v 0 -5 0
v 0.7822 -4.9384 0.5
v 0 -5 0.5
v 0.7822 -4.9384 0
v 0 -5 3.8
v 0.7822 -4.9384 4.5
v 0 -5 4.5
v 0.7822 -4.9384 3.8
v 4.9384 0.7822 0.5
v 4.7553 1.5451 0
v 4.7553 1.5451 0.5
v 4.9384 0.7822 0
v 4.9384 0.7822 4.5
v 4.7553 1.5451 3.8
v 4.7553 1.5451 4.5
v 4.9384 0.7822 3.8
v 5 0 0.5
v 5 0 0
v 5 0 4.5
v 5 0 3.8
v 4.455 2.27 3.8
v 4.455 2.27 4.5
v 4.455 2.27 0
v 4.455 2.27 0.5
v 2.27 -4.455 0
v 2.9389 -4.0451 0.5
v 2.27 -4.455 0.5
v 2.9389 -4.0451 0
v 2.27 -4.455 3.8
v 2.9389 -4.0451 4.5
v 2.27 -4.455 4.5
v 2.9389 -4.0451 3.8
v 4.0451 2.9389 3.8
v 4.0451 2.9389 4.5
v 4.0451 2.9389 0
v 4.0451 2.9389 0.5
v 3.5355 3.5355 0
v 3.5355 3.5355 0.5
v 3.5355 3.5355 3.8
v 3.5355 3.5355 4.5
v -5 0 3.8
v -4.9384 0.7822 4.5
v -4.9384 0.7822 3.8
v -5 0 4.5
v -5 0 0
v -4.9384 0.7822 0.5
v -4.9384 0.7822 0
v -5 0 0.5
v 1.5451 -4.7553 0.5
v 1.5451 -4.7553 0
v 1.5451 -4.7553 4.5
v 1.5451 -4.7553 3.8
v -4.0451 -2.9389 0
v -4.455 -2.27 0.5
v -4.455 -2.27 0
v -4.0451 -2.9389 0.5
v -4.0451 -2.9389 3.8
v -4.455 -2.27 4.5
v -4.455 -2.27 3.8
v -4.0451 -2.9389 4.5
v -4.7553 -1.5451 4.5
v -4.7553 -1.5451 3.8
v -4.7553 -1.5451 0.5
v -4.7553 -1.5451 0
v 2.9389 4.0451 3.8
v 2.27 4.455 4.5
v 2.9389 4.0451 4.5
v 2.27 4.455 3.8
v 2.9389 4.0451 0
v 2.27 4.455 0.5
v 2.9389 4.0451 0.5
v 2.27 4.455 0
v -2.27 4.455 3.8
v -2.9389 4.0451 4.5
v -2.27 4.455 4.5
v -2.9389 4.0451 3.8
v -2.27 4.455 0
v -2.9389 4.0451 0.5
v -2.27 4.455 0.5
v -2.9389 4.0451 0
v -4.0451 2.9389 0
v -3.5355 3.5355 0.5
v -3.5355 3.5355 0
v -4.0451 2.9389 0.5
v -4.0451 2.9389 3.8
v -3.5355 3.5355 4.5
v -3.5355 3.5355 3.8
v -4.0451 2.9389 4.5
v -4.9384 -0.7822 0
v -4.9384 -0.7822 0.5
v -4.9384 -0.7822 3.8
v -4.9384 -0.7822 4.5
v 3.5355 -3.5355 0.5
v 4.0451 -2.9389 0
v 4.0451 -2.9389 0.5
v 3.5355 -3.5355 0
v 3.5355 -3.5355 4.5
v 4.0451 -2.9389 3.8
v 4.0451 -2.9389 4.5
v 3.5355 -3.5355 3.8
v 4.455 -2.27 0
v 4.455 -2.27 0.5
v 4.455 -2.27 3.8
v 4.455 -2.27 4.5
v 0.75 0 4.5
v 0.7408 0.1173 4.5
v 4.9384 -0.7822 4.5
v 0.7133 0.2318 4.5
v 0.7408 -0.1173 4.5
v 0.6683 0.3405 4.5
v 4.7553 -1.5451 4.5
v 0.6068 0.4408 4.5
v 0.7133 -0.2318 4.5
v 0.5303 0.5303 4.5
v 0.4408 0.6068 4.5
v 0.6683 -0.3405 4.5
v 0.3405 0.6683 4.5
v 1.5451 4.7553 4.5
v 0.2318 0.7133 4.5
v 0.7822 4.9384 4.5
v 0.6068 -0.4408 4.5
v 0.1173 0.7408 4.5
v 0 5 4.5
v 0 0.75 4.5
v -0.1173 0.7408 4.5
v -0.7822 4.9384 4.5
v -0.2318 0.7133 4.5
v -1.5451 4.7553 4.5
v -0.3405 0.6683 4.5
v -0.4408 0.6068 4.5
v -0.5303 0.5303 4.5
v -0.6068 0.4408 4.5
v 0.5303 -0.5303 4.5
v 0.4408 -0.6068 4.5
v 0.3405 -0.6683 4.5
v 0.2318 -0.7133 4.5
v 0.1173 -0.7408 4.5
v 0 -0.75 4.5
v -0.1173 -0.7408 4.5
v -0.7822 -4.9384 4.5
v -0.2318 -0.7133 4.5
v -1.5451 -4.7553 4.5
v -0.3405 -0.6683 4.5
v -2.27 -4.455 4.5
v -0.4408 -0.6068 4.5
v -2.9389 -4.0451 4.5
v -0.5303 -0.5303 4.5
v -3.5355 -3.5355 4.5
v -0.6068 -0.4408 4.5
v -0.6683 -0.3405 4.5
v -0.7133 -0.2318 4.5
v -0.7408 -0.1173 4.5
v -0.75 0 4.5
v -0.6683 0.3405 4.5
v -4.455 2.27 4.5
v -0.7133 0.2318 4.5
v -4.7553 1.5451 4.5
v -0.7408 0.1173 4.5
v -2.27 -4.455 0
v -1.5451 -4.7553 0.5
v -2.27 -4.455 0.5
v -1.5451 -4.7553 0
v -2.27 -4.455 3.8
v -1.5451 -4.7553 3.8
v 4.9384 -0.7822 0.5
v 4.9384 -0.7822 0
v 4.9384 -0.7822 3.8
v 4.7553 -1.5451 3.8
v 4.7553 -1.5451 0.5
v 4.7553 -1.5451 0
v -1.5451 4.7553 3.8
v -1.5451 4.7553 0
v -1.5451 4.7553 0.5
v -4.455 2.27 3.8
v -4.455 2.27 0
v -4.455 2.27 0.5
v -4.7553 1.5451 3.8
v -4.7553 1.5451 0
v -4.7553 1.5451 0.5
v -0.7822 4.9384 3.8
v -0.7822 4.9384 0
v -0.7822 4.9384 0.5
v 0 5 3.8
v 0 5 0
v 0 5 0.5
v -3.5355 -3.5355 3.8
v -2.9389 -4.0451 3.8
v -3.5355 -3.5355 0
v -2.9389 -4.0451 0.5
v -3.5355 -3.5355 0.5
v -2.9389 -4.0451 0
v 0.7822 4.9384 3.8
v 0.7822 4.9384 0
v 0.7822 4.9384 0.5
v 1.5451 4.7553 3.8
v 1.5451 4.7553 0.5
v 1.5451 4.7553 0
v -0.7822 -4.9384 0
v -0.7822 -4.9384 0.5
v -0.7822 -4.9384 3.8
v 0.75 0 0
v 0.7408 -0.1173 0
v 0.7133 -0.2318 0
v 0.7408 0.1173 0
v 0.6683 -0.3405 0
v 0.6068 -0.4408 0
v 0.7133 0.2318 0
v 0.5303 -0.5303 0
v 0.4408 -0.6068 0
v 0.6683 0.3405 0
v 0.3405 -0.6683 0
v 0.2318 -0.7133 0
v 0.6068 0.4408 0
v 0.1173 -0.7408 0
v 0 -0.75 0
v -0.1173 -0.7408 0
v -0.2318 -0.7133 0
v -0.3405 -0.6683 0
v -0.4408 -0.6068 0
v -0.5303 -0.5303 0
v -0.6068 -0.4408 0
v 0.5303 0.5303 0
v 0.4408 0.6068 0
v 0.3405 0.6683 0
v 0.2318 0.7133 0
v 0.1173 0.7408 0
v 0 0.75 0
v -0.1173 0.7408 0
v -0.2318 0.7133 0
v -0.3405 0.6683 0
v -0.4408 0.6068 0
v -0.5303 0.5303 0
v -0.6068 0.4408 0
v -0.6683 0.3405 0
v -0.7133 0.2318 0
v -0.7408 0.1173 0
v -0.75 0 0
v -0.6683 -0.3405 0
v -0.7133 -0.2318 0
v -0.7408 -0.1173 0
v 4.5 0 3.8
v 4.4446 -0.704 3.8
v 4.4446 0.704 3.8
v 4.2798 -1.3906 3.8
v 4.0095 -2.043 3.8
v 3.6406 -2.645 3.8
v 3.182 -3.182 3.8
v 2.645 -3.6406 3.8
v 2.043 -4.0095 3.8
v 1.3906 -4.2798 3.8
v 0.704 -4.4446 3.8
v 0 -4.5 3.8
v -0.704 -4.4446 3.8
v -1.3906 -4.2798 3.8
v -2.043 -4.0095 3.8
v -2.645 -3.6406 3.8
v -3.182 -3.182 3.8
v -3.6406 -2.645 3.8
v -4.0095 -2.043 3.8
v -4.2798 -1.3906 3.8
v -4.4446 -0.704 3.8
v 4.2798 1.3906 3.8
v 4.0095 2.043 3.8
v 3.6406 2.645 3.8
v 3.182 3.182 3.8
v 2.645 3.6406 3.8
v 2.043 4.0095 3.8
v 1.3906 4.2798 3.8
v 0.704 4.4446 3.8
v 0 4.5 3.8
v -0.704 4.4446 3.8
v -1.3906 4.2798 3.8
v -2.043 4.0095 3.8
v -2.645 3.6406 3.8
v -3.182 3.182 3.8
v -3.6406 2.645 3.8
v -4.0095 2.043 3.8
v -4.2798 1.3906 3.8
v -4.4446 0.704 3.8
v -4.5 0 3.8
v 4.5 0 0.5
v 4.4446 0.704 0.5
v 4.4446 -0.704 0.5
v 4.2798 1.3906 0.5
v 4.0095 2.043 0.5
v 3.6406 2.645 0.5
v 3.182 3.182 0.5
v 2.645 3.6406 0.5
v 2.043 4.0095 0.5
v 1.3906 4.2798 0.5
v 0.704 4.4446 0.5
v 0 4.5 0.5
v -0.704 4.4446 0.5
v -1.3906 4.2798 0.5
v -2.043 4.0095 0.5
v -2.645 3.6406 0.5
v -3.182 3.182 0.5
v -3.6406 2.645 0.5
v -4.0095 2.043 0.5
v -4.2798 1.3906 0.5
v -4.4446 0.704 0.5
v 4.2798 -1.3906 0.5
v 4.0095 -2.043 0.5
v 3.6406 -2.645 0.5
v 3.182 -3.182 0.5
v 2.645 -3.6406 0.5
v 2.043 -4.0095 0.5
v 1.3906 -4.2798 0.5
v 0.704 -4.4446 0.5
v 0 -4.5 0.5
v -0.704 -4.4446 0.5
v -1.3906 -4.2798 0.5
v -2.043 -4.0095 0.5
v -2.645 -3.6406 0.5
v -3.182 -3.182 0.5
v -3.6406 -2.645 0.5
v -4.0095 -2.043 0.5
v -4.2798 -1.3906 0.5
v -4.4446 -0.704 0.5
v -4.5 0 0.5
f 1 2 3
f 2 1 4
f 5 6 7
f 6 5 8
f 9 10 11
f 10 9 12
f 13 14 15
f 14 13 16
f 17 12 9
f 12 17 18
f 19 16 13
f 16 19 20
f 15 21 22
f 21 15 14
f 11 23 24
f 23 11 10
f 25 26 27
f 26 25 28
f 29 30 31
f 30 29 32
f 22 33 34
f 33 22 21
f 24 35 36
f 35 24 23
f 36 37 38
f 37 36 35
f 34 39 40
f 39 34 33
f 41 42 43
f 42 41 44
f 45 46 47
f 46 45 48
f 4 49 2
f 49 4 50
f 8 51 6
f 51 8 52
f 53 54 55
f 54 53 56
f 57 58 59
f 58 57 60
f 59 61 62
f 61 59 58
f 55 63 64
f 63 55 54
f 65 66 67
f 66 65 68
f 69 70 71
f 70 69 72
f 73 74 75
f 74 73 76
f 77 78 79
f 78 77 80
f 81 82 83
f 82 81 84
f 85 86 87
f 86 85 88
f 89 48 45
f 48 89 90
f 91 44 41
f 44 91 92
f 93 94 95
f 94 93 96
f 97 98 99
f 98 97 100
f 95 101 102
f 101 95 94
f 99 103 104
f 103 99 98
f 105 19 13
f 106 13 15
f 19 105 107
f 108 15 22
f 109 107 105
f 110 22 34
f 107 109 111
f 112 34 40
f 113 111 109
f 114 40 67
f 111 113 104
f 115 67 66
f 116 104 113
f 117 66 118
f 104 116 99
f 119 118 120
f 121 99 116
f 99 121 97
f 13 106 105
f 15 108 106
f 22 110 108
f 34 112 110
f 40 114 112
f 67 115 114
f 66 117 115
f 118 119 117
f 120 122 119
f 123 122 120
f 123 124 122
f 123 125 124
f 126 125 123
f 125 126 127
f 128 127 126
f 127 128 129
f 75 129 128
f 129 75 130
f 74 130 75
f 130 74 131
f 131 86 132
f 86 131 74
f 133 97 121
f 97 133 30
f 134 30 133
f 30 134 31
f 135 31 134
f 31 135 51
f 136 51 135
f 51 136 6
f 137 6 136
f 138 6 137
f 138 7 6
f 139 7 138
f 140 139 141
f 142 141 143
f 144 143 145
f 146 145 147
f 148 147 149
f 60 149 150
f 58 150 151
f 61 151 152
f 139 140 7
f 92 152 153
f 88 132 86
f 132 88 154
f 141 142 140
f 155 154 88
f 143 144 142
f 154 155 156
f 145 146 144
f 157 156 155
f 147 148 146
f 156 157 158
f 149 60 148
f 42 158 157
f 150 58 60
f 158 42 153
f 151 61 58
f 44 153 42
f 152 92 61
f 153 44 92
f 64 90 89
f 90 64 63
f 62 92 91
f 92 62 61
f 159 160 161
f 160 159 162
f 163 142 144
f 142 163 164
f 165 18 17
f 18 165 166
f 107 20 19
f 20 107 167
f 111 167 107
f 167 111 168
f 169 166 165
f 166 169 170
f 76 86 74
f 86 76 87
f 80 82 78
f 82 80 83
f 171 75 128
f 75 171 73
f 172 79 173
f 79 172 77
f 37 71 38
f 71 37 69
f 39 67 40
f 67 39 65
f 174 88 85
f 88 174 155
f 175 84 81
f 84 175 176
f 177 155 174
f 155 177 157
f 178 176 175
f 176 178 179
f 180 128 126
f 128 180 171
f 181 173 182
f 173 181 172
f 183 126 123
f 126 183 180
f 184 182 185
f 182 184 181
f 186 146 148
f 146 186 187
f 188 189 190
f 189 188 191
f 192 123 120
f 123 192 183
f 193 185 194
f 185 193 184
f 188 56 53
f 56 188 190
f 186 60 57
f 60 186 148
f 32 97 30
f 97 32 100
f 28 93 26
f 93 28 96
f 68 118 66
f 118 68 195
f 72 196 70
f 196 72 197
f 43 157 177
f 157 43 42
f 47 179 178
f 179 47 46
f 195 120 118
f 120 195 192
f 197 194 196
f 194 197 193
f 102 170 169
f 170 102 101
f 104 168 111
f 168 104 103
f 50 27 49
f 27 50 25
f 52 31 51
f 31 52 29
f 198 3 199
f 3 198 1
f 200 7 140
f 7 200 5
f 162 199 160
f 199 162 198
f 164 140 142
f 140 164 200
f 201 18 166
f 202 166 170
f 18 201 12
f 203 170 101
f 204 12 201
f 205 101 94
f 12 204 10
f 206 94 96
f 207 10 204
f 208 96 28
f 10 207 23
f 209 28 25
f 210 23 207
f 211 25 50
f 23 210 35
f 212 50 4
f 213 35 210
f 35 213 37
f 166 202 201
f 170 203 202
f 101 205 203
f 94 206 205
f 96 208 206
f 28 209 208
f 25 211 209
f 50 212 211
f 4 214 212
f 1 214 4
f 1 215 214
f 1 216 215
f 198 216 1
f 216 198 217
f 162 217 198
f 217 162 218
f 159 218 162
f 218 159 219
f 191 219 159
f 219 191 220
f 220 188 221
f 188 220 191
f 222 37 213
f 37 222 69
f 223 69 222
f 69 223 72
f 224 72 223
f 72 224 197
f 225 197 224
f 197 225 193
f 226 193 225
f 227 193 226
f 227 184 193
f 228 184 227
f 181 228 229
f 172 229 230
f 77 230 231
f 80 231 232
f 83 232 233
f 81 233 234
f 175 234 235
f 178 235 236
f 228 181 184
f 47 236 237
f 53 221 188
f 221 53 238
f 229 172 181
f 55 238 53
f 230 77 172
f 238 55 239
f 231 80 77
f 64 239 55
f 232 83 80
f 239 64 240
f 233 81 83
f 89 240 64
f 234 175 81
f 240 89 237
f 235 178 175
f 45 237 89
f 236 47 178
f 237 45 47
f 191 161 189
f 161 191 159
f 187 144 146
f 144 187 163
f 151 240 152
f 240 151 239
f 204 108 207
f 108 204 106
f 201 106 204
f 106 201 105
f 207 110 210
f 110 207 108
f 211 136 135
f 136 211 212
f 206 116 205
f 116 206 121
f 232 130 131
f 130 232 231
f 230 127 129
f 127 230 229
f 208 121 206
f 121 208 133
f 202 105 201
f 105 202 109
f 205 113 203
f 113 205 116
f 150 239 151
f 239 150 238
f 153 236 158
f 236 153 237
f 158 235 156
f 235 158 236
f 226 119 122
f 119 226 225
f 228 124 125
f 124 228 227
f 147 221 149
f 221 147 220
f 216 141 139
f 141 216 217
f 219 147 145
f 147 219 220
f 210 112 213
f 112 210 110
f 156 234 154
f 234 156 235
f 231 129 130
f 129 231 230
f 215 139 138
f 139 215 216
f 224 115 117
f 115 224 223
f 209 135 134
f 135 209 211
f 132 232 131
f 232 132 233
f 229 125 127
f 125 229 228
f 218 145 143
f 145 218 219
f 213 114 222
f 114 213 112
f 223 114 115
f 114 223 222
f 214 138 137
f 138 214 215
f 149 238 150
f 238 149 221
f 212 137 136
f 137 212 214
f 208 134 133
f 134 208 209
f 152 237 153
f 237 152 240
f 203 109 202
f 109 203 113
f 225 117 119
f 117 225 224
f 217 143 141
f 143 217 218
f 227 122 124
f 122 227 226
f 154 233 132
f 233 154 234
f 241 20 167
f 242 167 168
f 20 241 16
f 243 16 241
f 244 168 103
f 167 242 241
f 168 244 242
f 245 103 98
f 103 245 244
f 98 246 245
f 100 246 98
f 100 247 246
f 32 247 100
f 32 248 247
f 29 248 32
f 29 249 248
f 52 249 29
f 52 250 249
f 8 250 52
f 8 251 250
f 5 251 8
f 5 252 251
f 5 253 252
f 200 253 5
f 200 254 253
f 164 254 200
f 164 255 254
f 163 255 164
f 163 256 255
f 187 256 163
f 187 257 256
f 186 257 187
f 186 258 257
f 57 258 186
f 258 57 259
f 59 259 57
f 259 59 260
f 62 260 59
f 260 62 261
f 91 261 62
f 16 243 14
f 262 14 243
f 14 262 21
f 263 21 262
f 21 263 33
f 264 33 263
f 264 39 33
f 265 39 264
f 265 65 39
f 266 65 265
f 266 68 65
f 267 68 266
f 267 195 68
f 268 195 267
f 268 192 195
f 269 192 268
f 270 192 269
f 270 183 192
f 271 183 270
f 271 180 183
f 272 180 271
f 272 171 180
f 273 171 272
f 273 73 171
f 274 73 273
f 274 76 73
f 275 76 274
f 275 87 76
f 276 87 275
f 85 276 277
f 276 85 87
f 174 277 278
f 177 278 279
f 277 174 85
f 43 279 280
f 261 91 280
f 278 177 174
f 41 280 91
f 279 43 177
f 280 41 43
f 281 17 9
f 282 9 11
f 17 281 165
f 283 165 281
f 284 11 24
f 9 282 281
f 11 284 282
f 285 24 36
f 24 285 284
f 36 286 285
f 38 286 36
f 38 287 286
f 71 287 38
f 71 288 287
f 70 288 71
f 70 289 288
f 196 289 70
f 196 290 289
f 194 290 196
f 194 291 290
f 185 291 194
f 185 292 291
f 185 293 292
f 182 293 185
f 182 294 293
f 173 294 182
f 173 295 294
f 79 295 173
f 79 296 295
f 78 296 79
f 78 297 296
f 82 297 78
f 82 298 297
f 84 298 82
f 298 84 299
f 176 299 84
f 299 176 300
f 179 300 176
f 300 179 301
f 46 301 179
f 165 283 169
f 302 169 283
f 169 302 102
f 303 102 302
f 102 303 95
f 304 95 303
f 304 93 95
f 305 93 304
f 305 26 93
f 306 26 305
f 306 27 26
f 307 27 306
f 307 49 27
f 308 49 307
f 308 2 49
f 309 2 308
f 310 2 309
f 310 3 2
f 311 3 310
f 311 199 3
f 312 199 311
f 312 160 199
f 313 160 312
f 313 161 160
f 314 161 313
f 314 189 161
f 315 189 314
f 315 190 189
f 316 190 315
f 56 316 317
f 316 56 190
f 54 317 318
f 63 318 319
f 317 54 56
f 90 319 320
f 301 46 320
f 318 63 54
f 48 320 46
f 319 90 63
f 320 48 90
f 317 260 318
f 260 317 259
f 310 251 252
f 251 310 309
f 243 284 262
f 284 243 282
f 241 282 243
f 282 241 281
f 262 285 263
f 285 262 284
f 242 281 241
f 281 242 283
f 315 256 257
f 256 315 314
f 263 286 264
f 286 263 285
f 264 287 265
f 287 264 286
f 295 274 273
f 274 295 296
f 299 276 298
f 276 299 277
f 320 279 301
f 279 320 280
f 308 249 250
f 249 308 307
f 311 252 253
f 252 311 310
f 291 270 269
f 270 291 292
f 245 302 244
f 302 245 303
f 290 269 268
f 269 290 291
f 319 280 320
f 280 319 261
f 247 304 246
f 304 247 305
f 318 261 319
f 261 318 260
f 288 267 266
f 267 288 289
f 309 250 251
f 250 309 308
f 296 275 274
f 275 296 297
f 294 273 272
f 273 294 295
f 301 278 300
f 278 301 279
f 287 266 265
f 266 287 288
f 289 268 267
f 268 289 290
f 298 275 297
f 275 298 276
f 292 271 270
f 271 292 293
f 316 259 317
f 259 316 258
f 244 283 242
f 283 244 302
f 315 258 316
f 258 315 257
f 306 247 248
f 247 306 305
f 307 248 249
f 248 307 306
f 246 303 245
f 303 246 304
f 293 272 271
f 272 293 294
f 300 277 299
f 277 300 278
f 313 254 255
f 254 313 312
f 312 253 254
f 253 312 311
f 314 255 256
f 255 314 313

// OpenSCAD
// file: lib/omniWheel.scad
omniWheelNumScrews = 4;

// Original motor.
// omniWheelMotorShaftRadius = 3.15;
// omniWheelSlotWidth = 4;
// omniWheelSlotThickness = 2;
// omniWheelSlotIndent = 0.5;
// omniWheelMotorShaftDepth = 11;

// Stepper motor.
omniWheelMotorShaftRadius = 2.6;
omniWheelSlotWidth = 4;
omniWheelSlotThickness = 2;
omniWheelSlotIndent = 0.3;
omniWheelMotorShaftDepth = 15;


omniWheelRadius2 = 30;
omniWheelRadius1 = omniWheelRadius2 - 2.5;

omniWheelLayerHeight = 3;
omniWheelBottomRiserRadius = 9;
omniWheelBottomRiserHeight = 9;
omniWheelBottomRiserRadiusBottom = omniWheelRadius1;
omniWheelBottomNeckHeight = 10;

omniWheelBottomTotalHeight = omniWheelBottomRiserRadius +
                             omniWheelBottomRiserHeight;

omniSlotMargin = 0.45;

omniWheelNumEdgeWheels = 16;
omniEdgeWheelRadius = 5;
omniEdgeWheelHeight = 4.5;

omniEdgeWheelHoleDiameter = 1.5;
omniEdgeWheelChannelWidth = 0.9;

omniEdgeWheelShaftOffset = 0.75;
omniEdgeWheelShaftStub = 2;

omniWheelScrewLengthRoom = 10;
omniWheelScrewHeadDepth = 1;
omniWheelScrewOffset = 13.5;

omniWheelScrewHeaderHeight = omniWheelScrewLengthRoom -
                              2*omniWheelLayerHeight + omniWheelScrewHeadDepth;

omniWheelGrooveDiameter = omniEdgeWheelRadius - 0.5;
omniWheelGrooveHeight = omniEdgeWheelHeight - 1.0;

module edgeWheelWithGroove() {
    $fn=40;
    difference() {
        difference() {
            cylinder(r = omniEdgeWheelRadius, h = omniEdgeWheelHeight);
            translate([0, 0, -iota]) {
                cylinder(d = omniEdgeWheelHoleDiameter,
                         h = omniEdgeWheelHeight+2*iota);
            }
        }
        translate([0, 0, (omniEdgeWheelHeight-omniWheelGrooveHeight)/2]) {
            difference() {
                cylinder(r = omniEdgeWheelRadius+2*iota,
                         h = omniWheelGrooveHeight-2*iota);
                translate([0, 0, -iota]) {
                    cylinder(r = omniWheelGrooveDiameter,
                             h = omniWheelGrooveHeight);
                }
            }
        }
    }
}

module basicWheelAdd() {
    cylinder(r1=omniWheelRadius2, r2=omniWheelRadius1,
        h=omniWheelLayerHeight, $fn=40);
}

module basicWheelDel() {
    $fn=40;
    module edgeWheelSlot() {
        translate([omniWheelRadius1-omniEdgeWheelShaftOffset-
                omniEdgeWheelRadius,
                -omniEdgeWheelHeight/2-omniSlotMargin, -iota]) {
            cube([2*omniEdgeWheelRadius,
                    omniEdgeWheelHeight+2*omniSlotMargin,
                    omniWheelBottomTotalHeight+2*iota
                ]);
        }
        translate([omniWheelRadius1-omniEdgeWheelShaftOffset-
                omniEdgeWheelRadius, 0, -iota]) {
            cylinder(d = omniEdgeWheelHeight+2*omniSlotMargin,
                h = omniWheelBottomTotalHeight+2*iota);
        }
    }

    for (a = [0 : 360/omniWheelNumEdgeWheels : 359]) {
        rotate([0, 0, a]) {
            edgeWheelSlot();
        }
    }
}

module wheelBottom() {
    $fn=40;
    module screwMount() {
        translate([omniWheelScrewOffset, 0, omniWheelLayerHeight]) {
            cylinder(d = screwHeadDiameter, h = omniWheelScrewHeaderHeight);
        }
    }
    module screwHole() {
        translate([omniWheelScrewOffset, 0, -iota]) {
            cylinder(d = screwHoleDiameter,
                h = screwLength-omniWheelLayerHeight+
                    omniWheelScrewHeadDepth);
        }
    }
    module channel() {
        wireLength = omniEdgeWheelHeight+2*omniSlotMargin+
                     2*omniEdgeWheelShaftStub;
        translate([omniWheelRadius1-omniEdgeWheelShaftOffset-
                omniEdgeWheelChannelWidth/2,
                -wireLength/2, -iota]) {
            cube([omniEdgeWheelChannelWidth,
                    wireLength, omniEdgeWheelChannelWidth]);
        }
    }
    module add() {
        basicWheelAdd();
        translate([0, 0, omniWheelLayerHeight]) {
            cylinder(r1=omniWheelBottomRiserRadiusBottom,
                r2=omniWheelBottomRiserRadius,
                h=omniWheelBottomRiserHeight, $fn=80);
        }
        translate([0, 0, omniWheelLayerHeight+omniWheelBottomRiserHeight]) {
            cylinder(r=omniWheelBottomRiserRadius,
                     h=omniWheelBottomNeckHeight, $fn=80);
        }
    }
    module del() {
        translate([0, 0, -iota]) {
            translate([0, 0, omniWheelLayerHeight+omniWheelBottomRiserHeight+
                             omniWheelBottomNeckHeight-
                             omniWheelMotorShaftDepth+2*iota]) {
                difference() {
                    cylinder(r=omniWheelMotorShaftRadius,
                             h=omniWheelMotorShaftDepth); // omniWheelBottomNeckHeight);
                    translate([-omniWheelSlotWidth/2,
                            omniWheelMotorShaftRadius - omniWheelSlotIndent,
                            0]) {
                        cube([omniWheelSlotWidth, omniWheelSlotThickness,
                                omniWheelBottomTotalHeight+2*iota]);
                    }
                }
            }
        }
        for (a = [0 : 360/omniWheelNumScrews : 359]) {
            rotate([0, 0, a]) {
                screwHole();
            }
        }
        for (a = [0 : 360/omniWheelNumEdgeWheels : 359]) {
            rotate([0, 0, a]) {
                channel();
            }
        }
        basicWheelDel();
    }
    difference() {
        add();
        del();
    }
}

module wheelTop() {
    $fn=40;
    module screwHole() {
        translate([omniWheelScrewOffset, 0, -iota]) {
            cylinder(d = screwBodyDiameter,
                h = omniWheelLayerHeight+2*iota);
            translate([0, 0,
                    omniWheelLayerHeight-omniWheelScrewHeadDepth+2*iota]) {
                cylinder(d = screwHeadDiameter,
                    h = omniWheelScrewHeadDepth);
            }
        }
    }

    module add() {
        basicWheelAdd();
    }

    module del() {
        for (a = [0 : 360/omniWheelNumScrews : 359]) {
            rotate([0, 0, a]) {
                screwHole();
            }
        }
        basicWheelDel();
    }

    difference() {
        add();
        del();
    }
}

module omniWheelExplodedView() {
    color("DodgerBlue") {
        wheelBottom();
    }
    color("DeepSkyBlue") {
        translate([0, 0, -20]) {
            rotate([180, 0, 0]) {
                wheelTop();
            }
        }
    }
    rotate([0, 90, 0]) {
        translate([10, omniWheelRadius1, -omniEdgeWheelHeight/2]) {
            edgeWheelWithGroove();
        }
    }
}
// file: lib/stepper.scad
smWidth = 42;
smLength = 40;
smScrewHoleOffsets = 31/2;
smCenterDiameter = 22;
smExtra = 1;

module stepperMotor() {
    smCenterHeight = 2;
    smShaftDiameter = 5;
    smShaftLength = 23;
    smScrewDepth = 4.5;
    smScrewDiameter = 3;
    smEdgeTrimOffset = 27;
    module add() {
        translate([-smWidth/2, -smLength, -smWidth/2]) {
            cube([smWidth, smLength, smWidth]);
        }
        rotate([-90, 0, 0]) {
            cylinder(d=smCenterDiameter, h=smCenterHeight, $fn=30);
            cylinder(d=smShaftDiameter, h=smShaftLength, $fn=20);
        }
    }
    module del() {
        for (x = [smScrewHoleOffsets, -smScrewHoleOffsets]) {
            for (z = [smScrewHoleOffsets, -smScrewHoleOffsets]) {
                translate([x, iota, z]) {
                    rotate([90, 0, 0]) {
                        cylinder(d=smScrewDiameter, h=smScrewDepth, $fn=40);
                    }
                }
            }
        }
        for (a = [45, 135, 225, 315]) {
            rotate([0, a, 0]) {
                translate([smEdgeTrimOffset,
                        -smLength-iota, -smWidth/2-iota]) {
                    cube([smWidth, smLength+2*iota, smWidth+2*iota]);
                }
            }
        }

    }
    difference() {
        add();
        del();
    }
}

module stepperMotorHole() {
    smHoleHeight = 20;
    smScrewHoleDiameter = 4;

    widthPlusExtra = smWidth + smExtra;
    lengthPlusExtra = smLength + smExtra/2;

    translate([-smWidth/2, -lengthPlusExtra, -widthPlusExtra/2]) {
        cube([smWidth, lengthPlusExtra, widthPlusExtra]);
    }
    translate([0, -iota, 0]) {
        rotate([-90, 0, 0]) {
            cylinder(d=smCenterDiameter+smExtra, h=smHoleHeight, $fn=40);
        }
    }
    for (x = [smScrewHoleOffsets, -smScrewHoleOffsets]) {
        for (z = [smScrewHoleOffsets, -smScrewHoleOffsets]) {
            translate([x, smHoleHeight-iota, z]) {
                rotate([90, 0, 0]) {
                    cylinder(d=smScrewHoleDiameter, h=smHoleHeight, $fn=40);
                }
            }
        }
    }

}
// file: lib/commonConstants.scad
// A small quantity to keep parts from starting or ending at exactly the
// same location. For example when we create a hole through an object we
// want the object being subtracted to stick slightly past the object being
// subtracted from.
iota = 0.1;


// Length and hole diameter of the #4 x 3/8in Phillips mount screw.
screwLength = 9.3;
screwHoleDiameter = 2.75;
screwHeadDiameter = 6.5;
screwBodyDiameter = 3.4;


// These constants are the basic parameters of the mount plate. They are
// necessary for other components to make their calculations.
mountPlateWidth = 37.6;
mountPlateLength = 51;


// These constants are the basis for the carbon fiber mount points. They are
// necessary for other components to make their calculations.
mountRodDiameter = 5.5;         // A little extra because holes are smaller.
mountThickness = 9;
mountDiameter = mountRodDiameter + 2*mountThickness;


// These constasnts are teh basis for the motor base. They are necessary for
// other components to make their calculations.
motorBaseExtraAxisOffset = 5;
motorBaseTopOffset = sqrt(3)*mountPlateWidth/6 + motorBaseExtraAxisOffset;
motorBaseBottomOffset = mountPlateLength/sqrt(2) + motorBaseTopOffset;
motorBaseBottomRadius = sqrt(pow(motorBaseBottomOffset,2) +
                             pow(mountPlateWidth/2, 2));
mountBaseRodOffsets = motorBaseBottomRadius-mountDiameter/2;
// main file
include <lib/commonConstants.scad>
include <lib/stepper.scad>
include <lib/omniWheel.scad>

edgeWheelWithGroove();
